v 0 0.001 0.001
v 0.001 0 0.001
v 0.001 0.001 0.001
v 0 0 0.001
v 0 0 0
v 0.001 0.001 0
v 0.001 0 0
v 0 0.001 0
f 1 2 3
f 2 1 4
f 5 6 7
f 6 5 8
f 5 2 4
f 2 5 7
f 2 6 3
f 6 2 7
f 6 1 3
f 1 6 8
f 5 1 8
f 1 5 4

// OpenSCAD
// t_path — the spine IR and the frame compiler. Pure data: nothing renders.
// This whole file is only possible because the IR is data (docs/developer/verification.md).

// clang-format off
use <../src/uniTube.scad>;
// clang-format on

// ============================================ the worked 90-degree elbow (docs/reference/ir.md)
c = [ 35, 15, 0 ];
u = [ 0, -1, 0 ];
v = [ 1, 0, 0 ];
elbow =
    ut_spine([ ut_line([ 0, 0, 0 ], [ 35, 0, 0 ]), ut_arc(c, u, v, 15, 90), ut_line([ 50, 15, 0 ], [ 50, 50, 0 ]) ]);

// The arc's endpoints and tangents, verifiable by hand with no rendering:
segA = ut_segs(elbow)[1];
assert(norm(ut_seg_p0(segA) - [ 35, 0, 0 ]) < 1e-9, "arc start = c + r*u");
assert(norm(ut_seg_p1(segA) - [ 50, 15, 0 ]) < 1e-9, "arc end = c + r*v at 90 deg");
assert(norm(ut_seg_t0(segA) - [ 1, 0, 0 ]) < 1e-9, "arc start tangent = v");
assert(norm(ut_seg_t1(segA) - [ 0, 1, 0 ]) < 1e-9, "arc end tangent = -u at 90 deg");

// EXIT CRITERION: exact developed length, no tessellation.
assert(abs(ut_length(elbow) - 93.5619449019) < 1e-9,
       str("exact developed length must be 93.5619449019, got ", ut_length(elbow)));

// ============================================ SPINE invariants must abort
// (Each of these is verified by the negative tests in `just check` rather than
// here, since an assert that fires cannot be caught inside OpenSCAD.)

// ============================================ stations
sts = ut_stations(elbow, [[ "frame", "transport" ]]);
N = len(sts);
assert(N >= 4, str("expected several stations, got ", N));

// STATION-1 — no two consecutive positions coincide (the dedupe that kills the
// coincident-point NaN in path_extrude.scad:58).
assert(min([for (i = [0:N - 2]) norm(ut_st_p(sts[i + 1]) - ut_st_p(sts[i]))]) > 1e-9,
       "STATION-1: duplicate consecutive stations");

// STATION-2 — orthonormal frames, no scale, no shear.
assert(max([for (s = sts) abs(norm(ut_st_t(s)) - 1)]) < 1e-9, "STATION-2: |t| = 1");
assert(max([for (s = sts) abs(norm(ut_st_n(s)) - 1)]) < 1e-9, "STATION-2: |n| = 1");
assert(max([for (s = sts) abs(ut_st_t(s) * ut_st_n(s))]) < 1e-9, "STATION-2: n must be orthogonal to t");

// STATION-3 — EXACT terminal tangents, not smoothed finite differences.
// This is what a threaded adapter is clocked against; inference measured 1.18 deg
// of skew here, which is ~0.4 mm of gap across a 20 mm flange.
assert(norm(ut_st_t(sts[0]) - [ 1, 0, 0 ]) < 1e-12, "STATION-3: first tangent must be EXACTLY [1,0,0]");
assert(norm(ut_st_t(sts[N - 1]) - [ 0, 1, 0 ]) < 1e-12, "STATION-3: last tangent must be EXACTLY [0,1,0]");

// STATION-4 — arclength starts at 0, strictly increases, ends at ut_length().
assert(abs(ut_st_s(sts[0])) < 1e-12, "STATION-4: s[0] = 0");
assert(min([for (i = [0:N - 2]) ut_st_s(sts[i + 1]) - ut_st_s(sts[i])]) > 0, "STATION-4: s strictly increasing");
assert(abs(ut_st_s(sts[N - 1]) - ut_length(elbow)) < 1e-6, "STATION-4: s[last] = exact developed length");

// STATION-5 — bounded turn between consecutive tangents.
assert(max([for (i = [0:N - 2]) ut_turn(ut_st_t(sts[i]), ut_st_t(sts[i + 1]))]) < 45, "STATION-5: bounded turn");

// EXIT CRITERION: a PLANAR bend produces EXACTLY zero twist.
// The roll reference [0,0,1] is parallel to the bend axis [0,0,1], and Rodrigues
// leaves a vector parallel to its axis invariant. docs/developer/history.md §2.
assert(max([for (s = sts) norm(ut_st_n(s) - [ 0, 0, 1 ])]) < 1e-12,
       "a planar bend must produce exactly zero twist -- every normal stays [0,0,1]");

// ============================================ the frame matrix
m = ut_st_mat(sts[N - 1]);
assert(abs(m[0][3] - 50) < 1e-9 && abs(m[1][3] - 50) < 1e-9, "ut_st_mat: translation column is the position");
det = m[0][0] * (m[1][1] * m[2][2] - m[1][2] * m[2][1]) - m[0][1] * (m[1][0] * m[2][2] - m[1][2] * m[2][0]) +
      m[0][2] * (m[1][0] * m[2][1] - m[1][1] * m[2][0]);
assert(abs(det - 1) < 1e-9, str("ut_st_mat: rotation must be right-handed with det +1, got ", det));

// ============================================ a NON-planar path really does twist
// Two bends in different planes: the frame must carry roll through, and must not
// spiral. This is the case half_curvedPipe.scad existed to solve.
sp2 = ut_spine([
    ut_line([ 0, 0, 0 ], [ 30, 0, 0 ]),                                      // +X
    ut_arc_from([ 30, 20, 0 ], [ 30, 0, 0 ], [ 50, 20, 0 ], [ 0, 0, 1 ]),    // bend in XY: +X -> +Y
    ut_line([ 50, 20, 0 ], [ 50, 50, 0 ]),                                   // +Y
    ut_arc_from([ 50, 50, 20 ], [ 50, 50, 0 ], [ 50, 70, 20 ], [ 1, 0, 0 ]), // bend in YZ: +Y -> +Z
    ut_line([ 50, 70, 20 ], [ 50, 70, 60 ]),                                 // +Z, vertical: the UP-seed degeneracy
]);
s2 = ut_stations(sp2);
assert(max([for (s = s2) abs(ut_st_t(s) * ut_st_n(s))]) < 1e-9, "non-planar: frames stay orthonormal");
assert(abs(ut_st_s(s2[len(s2) - 1]) - ut_length(sp2)) < 1e-6, "non-planar: arclength closes");
// The final leg runs straight up (+Z), where the UP seed is degenerate. The
// fallback must keep every normal finite -- this is the NaN that killed the
// previous attempt's own flagship example.
nlast = ut_st_n(s2[len(s2) - 1]);
assert(is_num(nlast[0]) && is_num(nlast[1]) && is_num(nlast[2]), "vertical final leg must not produce NaN normals");

// ============================================ explicit twist distributes by arclength
tw = ut_stations(elbow, [[ "twist", 90 ]]);
assert(abs(_t_roll(ut_st_n(tw[0]), [ 0, 0, 1 ])) < 1e-9, "twist: zero at the start");
function _t_roll(a, b) = ut_turn(a, b);
assert(abs(_t_roll(ut_st_n(tw[len(tw) - 1]), [ 0, 0, 1 ]) - 90) < 1e-6, "twist: full 90 deg by the end");

// ============================================ closed paths
// The machinery existed from Phase 1 and was unreachable; this is the coverage
// it never had. Reachable through ut_spine only -- ut_polyline refuses closed
// explicitly, and ut_turtle / ut_curve have no such parameter.
CR = 60;
loop = ut_spine(
    [
        ut_arc([ 0, 0, 0 ], [ 1, 0, 0 ], [ 0, 1, 0 ], CR, 90),
        ut_arc([ 0, 0, 0 ], [ 0, 1, 0 ], [ -1, 0, 0 ], CR, 90),
        ut_arc([ 0, 0, 0 ], [ -1, 0, 0 ], [ 0, -1, 0 ], CR, 90),
        ut_arc([ 0, 0, 0 ], [ 0, -1, 0 ], [ 1, 0, 0 ], CR, 90),
    ],
    closed = true);

assert(ut_closed(loop), "the spine records that it is closed");
assert(abs(ut_length(loop) - 2 * PI * CR) < 1e-9, "exact circumference, no tessellation");

csts = ut_stations(loop);
CN = len(csts);

// STATION-7 — NO duplicated terminal station. The last raw sample coincides with
// the first by construction; it must survive long enough to measure the loop
// holonomy but must not reach the backend, or the wrap ring stitches a station
// to itself. Measured before the fix: 88 degenerate triangles out of 2904.
assert(norm(ut_st_p(csts[CN - 1]) - ut_st_p(csts[0])) > 1,
       "STATION-7: a closed station list must not duplicate its terminal station");
assert(min([for (i = [0:CN - 2]) norm(ut_st_p(csts[i + 1]) - ut_st_p(csts[i]))]) > 1e-9, "STATION-1 holds too");

// And the emitted mesh has no degenerate faces.
crgn = ut_solid_rgn(ut_round(od = 14, wall = 2));
cpts = ut_mesh_points(crgn, csts, true);
cfcs = ut_mesh_faces(crgn, csts, true);
assert(len([for (f = cfcs) if (norm(cross(cpts[f[1]] - cpts[f[0]], cpts[f[2]] - cpts[f[0]])) / 2 < 1e-9) 1]) == 0,
       "a closed sweep must emit no degenerate triangles");

// The loop holonomy is measured, absorbed and distributed, so the seam meets
// itself: consecutive normals stay one step apart all the way round, including
// across the wrap from the last station back to the first.
assert(ut_turn(ut_st_n(csts[CN - 1]), ut_st_n(csts[0])) < 1e-6,
       str("closed-loop holonomy residual must vanish, got ", ut_turn(ut_st_n(csts[CN - 1]), ut_st_n(csts[0]))));
assert(max([for (s = csts) abs(ut_st_t(s) * ut_st_n(s))]) < 1e-9, "frames stay orthonormal all the way round");

// ================================================================ ut_at
// ut_at() had NO test at all, which is why the bug below survived: it reads
// position and tangent EXACTLY from the spine, and the tangent was wrong on
// every P segment.

// L and A segments are exact by construction.
apath = ut_polyline([ [ 0, 0, 0 ], [ 60, 0, 0 ], [ 60, 60, 0 ] ], r = 20);
assert(norm(ut_at(apath, 10)[0] - [ 10, 0, 0 ]) < 1e-9, "ut_at: position on a straight");
assert(ut_turn(ut_at(apath, 10)[1], [ 1, 0, 0 ]) < 1e-9, "ut_at: tangent on a straight");
assert(ut_turn(ut_at(apath, ut_length(apath) / 2)[1], ut_unit([ 1, 1, 0 ])) < 1e-9,
       "ut_at: the midpoint of a symmetric elbow bisects the turn exactly");
assert(ut_turn(ut_at(apath, ut_length(apath))[1], [ 0, 1, 0 ]) < 1e-9, "ut_at: the far end tangent");

// A P segment. The tangent is interpolated along the chord, so at a SAMPLE it is
// exactly the stored tangent. It used to be t[i+1] for every s, so ut_at(p, 0)
// returned the tangent one sample downstream -- measured 8.94 degrees out at the
// start of this very helix, one full sample's rotation, on a public function
// documented to return the tangent at s.
hf = function(t)[40 * cos(360 * t), 40 * sin(360 * t), 30 * t];
hd = function(t)[-2 * PI * 40 * sin(360 * t), 2 * PI * 40 * cos(360 * t), 30];
hp = ut_curve(hf, n = 40, dfdt = hd);
HL = ut_length(hp);
assert(ut_turn(ut_at(hp, 0)[1], ut_unit(hd(0))) < 1e-9,
       str("ut_at: the tangent at s=0 is the tangent AT s=0, got ", ut_turn(ut_at(hp, 0)[1], ut_unit(hd(0))), " deg"));
assert(ut_turn(ut_at(hp, HL)[1], ut_unit(hd(1))) < 1e-9, "ut_at: and at the far end");
// Between samples it stays second order -- 0.021 deg worst case at n=40.
assert(max([for (fr = [ 0.012, 0.137, 0.5, 0.863, 0.988 ]) ut_turn(ut_at(hp, HL *fr)[1], ut_unit(hd(fr)))]) < 0.05,
       "ut_at: interpolated tangents stay within 0.05 deg between samples");
// Position still walks the chain correctly.
assert(norm(ut_at(hp, 0)[0] - hf(0)) < 1e-9, "ut_at: position at s=0");

cube(0.001); // sentinel
